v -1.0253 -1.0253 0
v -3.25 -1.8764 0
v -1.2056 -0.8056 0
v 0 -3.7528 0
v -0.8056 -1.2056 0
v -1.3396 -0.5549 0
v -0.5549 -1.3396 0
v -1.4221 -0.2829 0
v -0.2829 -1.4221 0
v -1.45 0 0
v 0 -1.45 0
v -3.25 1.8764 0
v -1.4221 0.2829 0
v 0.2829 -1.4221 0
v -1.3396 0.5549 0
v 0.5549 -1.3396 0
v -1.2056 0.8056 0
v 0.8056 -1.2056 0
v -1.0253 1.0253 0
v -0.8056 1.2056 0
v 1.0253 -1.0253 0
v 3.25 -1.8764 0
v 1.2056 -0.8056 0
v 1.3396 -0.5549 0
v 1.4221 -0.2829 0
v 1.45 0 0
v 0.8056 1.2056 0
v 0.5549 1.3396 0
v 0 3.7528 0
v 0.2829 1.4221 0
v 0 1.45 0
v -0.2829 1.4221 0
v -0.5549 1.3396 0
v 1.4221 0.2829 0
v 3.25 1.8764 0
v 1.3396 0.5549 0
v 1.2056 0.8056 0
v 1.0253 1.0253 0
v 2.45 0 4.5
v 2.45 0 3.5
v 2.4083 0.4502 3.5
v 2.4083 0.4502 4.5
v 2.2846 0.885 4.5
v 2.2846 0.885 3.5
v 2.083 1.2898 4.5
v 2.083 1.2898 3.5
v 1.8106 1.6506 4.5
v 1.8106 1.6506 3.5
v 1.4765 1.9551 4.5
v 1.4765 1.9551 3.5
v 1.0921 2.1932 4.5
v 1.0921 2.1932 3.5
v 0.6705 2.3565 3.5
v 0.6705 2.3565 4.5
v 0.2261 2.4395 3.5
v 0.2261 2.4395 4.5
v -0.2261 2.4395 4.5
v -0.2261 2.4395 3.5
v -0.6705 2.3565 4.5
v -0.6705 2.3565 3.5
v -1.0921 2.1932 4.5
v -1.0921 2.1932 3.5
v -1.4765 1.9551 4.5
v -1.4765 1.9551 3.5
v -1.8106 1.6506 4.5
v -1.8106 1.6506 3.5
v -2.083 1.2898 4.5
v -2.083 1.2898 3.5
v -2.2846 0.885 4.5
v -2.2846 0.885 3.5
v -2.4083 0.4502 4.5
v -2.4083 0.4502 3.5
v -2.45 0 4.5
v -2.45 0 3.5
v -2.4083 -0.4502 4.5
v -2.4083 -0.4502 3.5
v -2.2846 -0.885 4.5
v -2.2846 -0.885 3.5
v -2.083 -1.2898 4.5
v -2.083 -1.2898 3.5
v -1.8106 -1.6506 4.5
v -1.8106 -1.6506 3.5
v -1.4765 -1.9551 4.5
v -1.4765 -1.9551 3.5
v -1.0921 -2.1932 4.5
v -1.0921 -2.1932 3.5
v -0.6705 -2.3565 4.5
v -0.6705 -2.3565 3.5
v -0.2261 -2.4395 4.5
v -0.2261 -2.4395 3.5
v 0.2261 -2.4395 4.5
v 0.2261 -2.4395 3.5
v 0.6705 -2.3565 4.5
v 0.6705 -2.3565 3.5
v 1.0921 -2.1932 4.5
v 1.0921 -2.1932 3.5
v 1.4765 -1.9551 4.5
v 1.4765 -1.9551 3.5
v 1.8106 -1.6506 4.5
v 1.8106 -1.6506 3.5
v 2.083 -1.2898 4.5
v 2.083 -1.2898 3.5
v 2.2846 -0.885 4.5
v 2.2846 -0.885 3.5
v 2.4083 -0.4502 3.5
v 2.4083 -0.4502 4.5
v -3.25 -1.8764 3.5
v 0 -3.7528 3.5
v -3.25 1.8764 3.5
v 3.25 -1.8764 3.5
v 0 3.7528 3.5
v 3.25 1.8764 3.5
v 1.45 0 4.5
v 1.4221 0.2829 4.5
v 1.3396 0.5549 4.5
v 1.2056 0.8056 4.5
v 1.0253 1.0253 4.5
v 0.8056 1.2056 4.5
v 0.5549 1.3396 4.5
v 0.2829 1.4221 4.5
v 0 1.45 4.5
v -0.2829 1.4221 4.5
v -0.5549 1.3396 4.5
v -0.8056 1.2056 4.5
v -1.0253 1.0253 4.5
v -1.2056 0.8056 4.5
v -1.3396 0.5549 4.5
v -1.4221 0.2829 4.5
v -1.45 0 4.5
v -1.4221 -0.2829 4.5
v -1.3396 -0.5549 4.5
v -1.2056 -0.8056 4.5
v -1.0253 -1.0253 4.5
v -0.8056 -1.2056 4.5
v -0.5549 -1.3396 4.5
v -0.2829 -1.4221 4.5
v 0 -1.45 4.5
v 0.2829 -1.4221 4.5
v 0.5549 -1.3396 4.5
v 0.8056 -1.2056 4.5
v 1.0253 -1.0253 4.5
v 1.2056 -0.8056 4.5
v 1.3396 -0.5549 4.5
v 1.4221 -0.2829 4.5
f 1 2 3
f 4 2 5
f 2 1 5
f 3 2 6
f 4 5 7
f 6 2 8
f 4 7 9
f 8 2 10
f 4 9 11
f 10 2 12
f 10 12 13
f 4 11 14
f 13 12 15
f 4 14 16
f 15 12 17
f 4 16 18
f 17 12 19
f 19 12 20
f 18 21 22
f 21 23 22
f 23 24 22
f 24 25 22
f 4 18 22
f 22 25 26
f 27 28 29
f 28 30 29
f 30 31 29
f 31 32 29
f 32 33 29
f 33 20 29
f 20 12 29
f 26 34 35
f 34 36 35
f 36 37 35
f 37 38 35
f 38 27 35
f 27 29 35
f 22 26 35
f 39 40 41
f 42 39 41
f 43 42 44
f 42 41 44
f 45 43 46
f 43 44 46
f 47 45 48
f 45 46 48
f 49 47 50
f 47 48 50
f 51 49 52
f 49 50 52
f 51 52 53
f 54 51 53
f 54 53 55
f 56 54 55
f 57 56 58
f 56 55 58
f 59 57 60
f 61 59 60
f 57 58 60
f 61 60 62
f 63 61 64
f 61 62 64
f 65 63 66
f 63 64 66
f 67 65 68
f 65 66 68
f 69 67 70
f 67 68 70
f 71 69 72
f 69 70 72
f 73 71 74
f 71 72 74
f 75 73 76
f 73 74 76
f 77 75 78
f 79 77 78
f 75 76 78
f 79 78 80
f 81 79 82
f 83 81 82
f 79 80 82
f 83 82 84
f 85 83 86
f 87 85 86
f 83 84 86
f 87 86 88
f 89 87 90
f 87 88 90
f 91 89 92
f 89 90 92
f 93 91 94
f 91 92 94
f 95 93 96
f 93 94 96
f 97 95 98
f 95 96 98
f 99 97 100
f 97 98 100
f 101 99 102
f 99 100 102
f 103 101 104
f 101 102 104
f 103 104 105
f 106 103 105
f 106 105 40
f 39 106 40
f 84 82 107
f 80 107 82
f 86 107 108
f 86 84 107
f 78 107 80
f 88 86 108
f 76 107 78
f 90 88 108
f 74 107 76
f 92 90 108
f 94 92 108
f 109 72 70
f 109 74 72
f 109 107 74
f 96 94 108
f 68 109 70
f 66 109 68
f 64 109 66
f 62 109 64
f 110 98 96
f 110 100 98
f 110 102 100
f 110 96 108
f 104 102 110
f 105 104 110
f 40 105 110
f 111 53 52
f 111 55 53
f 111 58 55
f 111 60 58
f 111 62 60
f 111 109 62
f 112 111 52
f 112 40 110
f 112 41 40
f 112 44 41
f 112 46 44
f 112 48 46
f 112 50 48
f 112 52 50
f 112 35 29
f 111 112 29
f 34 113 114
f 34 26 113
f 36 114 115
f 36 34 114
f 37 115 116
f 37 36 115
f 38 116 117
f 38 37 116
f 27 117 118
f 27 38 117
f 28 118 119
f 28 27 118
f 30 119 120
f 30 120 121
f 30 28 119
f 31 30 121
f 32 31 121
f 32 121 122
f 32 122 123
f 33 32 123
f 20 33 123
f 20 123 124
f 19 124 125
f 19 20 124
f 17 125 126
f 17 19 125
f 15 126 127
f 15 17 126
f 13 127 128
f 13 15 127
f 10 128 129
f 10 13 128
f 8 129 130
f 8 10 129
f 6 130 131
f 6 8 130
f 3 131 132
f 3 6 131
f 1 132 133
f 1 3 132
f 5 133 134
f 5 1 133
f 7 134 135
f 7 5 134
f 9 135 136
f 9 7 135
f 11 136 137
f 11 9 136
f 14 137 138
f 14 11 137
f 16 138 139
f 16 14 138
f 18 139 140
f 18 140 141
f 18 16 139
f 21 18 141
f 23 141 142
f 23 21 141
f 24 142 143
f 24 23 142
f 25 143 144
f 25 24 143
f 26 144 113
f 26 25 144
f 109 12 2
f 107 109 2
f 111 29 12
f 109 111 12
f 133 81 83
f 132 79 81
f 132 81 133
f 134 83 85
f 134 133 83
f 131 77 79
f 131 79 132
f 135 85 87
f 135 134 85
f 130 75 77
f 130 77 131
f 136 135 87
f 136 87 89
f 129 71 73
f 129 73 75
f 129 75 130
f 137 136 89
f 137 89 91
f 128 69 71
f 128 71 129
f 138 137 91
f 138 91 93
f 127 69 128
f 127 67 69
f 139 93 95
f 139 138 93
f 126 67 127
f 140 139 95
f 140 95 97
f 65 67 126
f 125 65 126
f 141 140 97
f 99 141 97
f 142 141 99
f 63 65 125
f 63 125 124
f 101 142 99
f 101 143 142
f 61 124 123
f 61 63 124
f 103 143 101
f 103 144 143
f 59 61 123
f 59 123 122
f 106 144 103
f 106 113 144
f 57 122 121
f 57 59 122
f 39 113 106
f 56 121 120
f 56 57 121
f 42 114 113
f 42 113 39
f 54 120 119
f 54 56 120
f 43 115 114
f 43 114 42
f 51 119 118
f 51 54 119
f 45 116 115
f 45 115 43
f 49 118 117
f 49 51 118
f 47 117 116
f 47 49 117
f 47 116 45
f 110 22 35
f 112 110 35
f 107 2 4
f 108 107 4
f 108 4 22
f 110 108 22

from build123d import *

# Parameters (mm, degrees)
F0_R     = 2.45
F0_R_2   = 1.45
F1_DEPTH = 2.5
F2_DEPTH = 2
F3_DEPTH = 3.5


# Not quite as in the source:
# - a feature names something its author has since deleted; it is built from what else it names


with BuildPart() as f1:
    # F0 (on Top) → F1 (new body)
    with BuildSketch(Plane.XY):
        Circle(F0_R)
        Circle(F0_R_2, mode=Mode.SUBTRACT)
    extrude(amount=F1_DEPTH)

    # F2 (add): a face of the model
    f2_faces = [f1.faces().sort_by_distance(p)[0] for p in [
        (-2.3807035354, 0, 2.5),
    ]]
    extrude(f2_faces, amount=F2_DEPTH)

    # F0 (on Top) → F3 (join)
    with BuildSketch(Plane.XY):
        Polygon((3.25, -1.8763883749), (3.25, 1.8763883749), (0, 3.7527767497), (-3.25, 1.8763883749), (-3.25, -1.8763883749), (0, -3.7527767497), align=None)
        Circle(F0_R, mode=Mode.SUBTRACT)
    extrude(amount=F3_DEPTH)


solid = f1.part
